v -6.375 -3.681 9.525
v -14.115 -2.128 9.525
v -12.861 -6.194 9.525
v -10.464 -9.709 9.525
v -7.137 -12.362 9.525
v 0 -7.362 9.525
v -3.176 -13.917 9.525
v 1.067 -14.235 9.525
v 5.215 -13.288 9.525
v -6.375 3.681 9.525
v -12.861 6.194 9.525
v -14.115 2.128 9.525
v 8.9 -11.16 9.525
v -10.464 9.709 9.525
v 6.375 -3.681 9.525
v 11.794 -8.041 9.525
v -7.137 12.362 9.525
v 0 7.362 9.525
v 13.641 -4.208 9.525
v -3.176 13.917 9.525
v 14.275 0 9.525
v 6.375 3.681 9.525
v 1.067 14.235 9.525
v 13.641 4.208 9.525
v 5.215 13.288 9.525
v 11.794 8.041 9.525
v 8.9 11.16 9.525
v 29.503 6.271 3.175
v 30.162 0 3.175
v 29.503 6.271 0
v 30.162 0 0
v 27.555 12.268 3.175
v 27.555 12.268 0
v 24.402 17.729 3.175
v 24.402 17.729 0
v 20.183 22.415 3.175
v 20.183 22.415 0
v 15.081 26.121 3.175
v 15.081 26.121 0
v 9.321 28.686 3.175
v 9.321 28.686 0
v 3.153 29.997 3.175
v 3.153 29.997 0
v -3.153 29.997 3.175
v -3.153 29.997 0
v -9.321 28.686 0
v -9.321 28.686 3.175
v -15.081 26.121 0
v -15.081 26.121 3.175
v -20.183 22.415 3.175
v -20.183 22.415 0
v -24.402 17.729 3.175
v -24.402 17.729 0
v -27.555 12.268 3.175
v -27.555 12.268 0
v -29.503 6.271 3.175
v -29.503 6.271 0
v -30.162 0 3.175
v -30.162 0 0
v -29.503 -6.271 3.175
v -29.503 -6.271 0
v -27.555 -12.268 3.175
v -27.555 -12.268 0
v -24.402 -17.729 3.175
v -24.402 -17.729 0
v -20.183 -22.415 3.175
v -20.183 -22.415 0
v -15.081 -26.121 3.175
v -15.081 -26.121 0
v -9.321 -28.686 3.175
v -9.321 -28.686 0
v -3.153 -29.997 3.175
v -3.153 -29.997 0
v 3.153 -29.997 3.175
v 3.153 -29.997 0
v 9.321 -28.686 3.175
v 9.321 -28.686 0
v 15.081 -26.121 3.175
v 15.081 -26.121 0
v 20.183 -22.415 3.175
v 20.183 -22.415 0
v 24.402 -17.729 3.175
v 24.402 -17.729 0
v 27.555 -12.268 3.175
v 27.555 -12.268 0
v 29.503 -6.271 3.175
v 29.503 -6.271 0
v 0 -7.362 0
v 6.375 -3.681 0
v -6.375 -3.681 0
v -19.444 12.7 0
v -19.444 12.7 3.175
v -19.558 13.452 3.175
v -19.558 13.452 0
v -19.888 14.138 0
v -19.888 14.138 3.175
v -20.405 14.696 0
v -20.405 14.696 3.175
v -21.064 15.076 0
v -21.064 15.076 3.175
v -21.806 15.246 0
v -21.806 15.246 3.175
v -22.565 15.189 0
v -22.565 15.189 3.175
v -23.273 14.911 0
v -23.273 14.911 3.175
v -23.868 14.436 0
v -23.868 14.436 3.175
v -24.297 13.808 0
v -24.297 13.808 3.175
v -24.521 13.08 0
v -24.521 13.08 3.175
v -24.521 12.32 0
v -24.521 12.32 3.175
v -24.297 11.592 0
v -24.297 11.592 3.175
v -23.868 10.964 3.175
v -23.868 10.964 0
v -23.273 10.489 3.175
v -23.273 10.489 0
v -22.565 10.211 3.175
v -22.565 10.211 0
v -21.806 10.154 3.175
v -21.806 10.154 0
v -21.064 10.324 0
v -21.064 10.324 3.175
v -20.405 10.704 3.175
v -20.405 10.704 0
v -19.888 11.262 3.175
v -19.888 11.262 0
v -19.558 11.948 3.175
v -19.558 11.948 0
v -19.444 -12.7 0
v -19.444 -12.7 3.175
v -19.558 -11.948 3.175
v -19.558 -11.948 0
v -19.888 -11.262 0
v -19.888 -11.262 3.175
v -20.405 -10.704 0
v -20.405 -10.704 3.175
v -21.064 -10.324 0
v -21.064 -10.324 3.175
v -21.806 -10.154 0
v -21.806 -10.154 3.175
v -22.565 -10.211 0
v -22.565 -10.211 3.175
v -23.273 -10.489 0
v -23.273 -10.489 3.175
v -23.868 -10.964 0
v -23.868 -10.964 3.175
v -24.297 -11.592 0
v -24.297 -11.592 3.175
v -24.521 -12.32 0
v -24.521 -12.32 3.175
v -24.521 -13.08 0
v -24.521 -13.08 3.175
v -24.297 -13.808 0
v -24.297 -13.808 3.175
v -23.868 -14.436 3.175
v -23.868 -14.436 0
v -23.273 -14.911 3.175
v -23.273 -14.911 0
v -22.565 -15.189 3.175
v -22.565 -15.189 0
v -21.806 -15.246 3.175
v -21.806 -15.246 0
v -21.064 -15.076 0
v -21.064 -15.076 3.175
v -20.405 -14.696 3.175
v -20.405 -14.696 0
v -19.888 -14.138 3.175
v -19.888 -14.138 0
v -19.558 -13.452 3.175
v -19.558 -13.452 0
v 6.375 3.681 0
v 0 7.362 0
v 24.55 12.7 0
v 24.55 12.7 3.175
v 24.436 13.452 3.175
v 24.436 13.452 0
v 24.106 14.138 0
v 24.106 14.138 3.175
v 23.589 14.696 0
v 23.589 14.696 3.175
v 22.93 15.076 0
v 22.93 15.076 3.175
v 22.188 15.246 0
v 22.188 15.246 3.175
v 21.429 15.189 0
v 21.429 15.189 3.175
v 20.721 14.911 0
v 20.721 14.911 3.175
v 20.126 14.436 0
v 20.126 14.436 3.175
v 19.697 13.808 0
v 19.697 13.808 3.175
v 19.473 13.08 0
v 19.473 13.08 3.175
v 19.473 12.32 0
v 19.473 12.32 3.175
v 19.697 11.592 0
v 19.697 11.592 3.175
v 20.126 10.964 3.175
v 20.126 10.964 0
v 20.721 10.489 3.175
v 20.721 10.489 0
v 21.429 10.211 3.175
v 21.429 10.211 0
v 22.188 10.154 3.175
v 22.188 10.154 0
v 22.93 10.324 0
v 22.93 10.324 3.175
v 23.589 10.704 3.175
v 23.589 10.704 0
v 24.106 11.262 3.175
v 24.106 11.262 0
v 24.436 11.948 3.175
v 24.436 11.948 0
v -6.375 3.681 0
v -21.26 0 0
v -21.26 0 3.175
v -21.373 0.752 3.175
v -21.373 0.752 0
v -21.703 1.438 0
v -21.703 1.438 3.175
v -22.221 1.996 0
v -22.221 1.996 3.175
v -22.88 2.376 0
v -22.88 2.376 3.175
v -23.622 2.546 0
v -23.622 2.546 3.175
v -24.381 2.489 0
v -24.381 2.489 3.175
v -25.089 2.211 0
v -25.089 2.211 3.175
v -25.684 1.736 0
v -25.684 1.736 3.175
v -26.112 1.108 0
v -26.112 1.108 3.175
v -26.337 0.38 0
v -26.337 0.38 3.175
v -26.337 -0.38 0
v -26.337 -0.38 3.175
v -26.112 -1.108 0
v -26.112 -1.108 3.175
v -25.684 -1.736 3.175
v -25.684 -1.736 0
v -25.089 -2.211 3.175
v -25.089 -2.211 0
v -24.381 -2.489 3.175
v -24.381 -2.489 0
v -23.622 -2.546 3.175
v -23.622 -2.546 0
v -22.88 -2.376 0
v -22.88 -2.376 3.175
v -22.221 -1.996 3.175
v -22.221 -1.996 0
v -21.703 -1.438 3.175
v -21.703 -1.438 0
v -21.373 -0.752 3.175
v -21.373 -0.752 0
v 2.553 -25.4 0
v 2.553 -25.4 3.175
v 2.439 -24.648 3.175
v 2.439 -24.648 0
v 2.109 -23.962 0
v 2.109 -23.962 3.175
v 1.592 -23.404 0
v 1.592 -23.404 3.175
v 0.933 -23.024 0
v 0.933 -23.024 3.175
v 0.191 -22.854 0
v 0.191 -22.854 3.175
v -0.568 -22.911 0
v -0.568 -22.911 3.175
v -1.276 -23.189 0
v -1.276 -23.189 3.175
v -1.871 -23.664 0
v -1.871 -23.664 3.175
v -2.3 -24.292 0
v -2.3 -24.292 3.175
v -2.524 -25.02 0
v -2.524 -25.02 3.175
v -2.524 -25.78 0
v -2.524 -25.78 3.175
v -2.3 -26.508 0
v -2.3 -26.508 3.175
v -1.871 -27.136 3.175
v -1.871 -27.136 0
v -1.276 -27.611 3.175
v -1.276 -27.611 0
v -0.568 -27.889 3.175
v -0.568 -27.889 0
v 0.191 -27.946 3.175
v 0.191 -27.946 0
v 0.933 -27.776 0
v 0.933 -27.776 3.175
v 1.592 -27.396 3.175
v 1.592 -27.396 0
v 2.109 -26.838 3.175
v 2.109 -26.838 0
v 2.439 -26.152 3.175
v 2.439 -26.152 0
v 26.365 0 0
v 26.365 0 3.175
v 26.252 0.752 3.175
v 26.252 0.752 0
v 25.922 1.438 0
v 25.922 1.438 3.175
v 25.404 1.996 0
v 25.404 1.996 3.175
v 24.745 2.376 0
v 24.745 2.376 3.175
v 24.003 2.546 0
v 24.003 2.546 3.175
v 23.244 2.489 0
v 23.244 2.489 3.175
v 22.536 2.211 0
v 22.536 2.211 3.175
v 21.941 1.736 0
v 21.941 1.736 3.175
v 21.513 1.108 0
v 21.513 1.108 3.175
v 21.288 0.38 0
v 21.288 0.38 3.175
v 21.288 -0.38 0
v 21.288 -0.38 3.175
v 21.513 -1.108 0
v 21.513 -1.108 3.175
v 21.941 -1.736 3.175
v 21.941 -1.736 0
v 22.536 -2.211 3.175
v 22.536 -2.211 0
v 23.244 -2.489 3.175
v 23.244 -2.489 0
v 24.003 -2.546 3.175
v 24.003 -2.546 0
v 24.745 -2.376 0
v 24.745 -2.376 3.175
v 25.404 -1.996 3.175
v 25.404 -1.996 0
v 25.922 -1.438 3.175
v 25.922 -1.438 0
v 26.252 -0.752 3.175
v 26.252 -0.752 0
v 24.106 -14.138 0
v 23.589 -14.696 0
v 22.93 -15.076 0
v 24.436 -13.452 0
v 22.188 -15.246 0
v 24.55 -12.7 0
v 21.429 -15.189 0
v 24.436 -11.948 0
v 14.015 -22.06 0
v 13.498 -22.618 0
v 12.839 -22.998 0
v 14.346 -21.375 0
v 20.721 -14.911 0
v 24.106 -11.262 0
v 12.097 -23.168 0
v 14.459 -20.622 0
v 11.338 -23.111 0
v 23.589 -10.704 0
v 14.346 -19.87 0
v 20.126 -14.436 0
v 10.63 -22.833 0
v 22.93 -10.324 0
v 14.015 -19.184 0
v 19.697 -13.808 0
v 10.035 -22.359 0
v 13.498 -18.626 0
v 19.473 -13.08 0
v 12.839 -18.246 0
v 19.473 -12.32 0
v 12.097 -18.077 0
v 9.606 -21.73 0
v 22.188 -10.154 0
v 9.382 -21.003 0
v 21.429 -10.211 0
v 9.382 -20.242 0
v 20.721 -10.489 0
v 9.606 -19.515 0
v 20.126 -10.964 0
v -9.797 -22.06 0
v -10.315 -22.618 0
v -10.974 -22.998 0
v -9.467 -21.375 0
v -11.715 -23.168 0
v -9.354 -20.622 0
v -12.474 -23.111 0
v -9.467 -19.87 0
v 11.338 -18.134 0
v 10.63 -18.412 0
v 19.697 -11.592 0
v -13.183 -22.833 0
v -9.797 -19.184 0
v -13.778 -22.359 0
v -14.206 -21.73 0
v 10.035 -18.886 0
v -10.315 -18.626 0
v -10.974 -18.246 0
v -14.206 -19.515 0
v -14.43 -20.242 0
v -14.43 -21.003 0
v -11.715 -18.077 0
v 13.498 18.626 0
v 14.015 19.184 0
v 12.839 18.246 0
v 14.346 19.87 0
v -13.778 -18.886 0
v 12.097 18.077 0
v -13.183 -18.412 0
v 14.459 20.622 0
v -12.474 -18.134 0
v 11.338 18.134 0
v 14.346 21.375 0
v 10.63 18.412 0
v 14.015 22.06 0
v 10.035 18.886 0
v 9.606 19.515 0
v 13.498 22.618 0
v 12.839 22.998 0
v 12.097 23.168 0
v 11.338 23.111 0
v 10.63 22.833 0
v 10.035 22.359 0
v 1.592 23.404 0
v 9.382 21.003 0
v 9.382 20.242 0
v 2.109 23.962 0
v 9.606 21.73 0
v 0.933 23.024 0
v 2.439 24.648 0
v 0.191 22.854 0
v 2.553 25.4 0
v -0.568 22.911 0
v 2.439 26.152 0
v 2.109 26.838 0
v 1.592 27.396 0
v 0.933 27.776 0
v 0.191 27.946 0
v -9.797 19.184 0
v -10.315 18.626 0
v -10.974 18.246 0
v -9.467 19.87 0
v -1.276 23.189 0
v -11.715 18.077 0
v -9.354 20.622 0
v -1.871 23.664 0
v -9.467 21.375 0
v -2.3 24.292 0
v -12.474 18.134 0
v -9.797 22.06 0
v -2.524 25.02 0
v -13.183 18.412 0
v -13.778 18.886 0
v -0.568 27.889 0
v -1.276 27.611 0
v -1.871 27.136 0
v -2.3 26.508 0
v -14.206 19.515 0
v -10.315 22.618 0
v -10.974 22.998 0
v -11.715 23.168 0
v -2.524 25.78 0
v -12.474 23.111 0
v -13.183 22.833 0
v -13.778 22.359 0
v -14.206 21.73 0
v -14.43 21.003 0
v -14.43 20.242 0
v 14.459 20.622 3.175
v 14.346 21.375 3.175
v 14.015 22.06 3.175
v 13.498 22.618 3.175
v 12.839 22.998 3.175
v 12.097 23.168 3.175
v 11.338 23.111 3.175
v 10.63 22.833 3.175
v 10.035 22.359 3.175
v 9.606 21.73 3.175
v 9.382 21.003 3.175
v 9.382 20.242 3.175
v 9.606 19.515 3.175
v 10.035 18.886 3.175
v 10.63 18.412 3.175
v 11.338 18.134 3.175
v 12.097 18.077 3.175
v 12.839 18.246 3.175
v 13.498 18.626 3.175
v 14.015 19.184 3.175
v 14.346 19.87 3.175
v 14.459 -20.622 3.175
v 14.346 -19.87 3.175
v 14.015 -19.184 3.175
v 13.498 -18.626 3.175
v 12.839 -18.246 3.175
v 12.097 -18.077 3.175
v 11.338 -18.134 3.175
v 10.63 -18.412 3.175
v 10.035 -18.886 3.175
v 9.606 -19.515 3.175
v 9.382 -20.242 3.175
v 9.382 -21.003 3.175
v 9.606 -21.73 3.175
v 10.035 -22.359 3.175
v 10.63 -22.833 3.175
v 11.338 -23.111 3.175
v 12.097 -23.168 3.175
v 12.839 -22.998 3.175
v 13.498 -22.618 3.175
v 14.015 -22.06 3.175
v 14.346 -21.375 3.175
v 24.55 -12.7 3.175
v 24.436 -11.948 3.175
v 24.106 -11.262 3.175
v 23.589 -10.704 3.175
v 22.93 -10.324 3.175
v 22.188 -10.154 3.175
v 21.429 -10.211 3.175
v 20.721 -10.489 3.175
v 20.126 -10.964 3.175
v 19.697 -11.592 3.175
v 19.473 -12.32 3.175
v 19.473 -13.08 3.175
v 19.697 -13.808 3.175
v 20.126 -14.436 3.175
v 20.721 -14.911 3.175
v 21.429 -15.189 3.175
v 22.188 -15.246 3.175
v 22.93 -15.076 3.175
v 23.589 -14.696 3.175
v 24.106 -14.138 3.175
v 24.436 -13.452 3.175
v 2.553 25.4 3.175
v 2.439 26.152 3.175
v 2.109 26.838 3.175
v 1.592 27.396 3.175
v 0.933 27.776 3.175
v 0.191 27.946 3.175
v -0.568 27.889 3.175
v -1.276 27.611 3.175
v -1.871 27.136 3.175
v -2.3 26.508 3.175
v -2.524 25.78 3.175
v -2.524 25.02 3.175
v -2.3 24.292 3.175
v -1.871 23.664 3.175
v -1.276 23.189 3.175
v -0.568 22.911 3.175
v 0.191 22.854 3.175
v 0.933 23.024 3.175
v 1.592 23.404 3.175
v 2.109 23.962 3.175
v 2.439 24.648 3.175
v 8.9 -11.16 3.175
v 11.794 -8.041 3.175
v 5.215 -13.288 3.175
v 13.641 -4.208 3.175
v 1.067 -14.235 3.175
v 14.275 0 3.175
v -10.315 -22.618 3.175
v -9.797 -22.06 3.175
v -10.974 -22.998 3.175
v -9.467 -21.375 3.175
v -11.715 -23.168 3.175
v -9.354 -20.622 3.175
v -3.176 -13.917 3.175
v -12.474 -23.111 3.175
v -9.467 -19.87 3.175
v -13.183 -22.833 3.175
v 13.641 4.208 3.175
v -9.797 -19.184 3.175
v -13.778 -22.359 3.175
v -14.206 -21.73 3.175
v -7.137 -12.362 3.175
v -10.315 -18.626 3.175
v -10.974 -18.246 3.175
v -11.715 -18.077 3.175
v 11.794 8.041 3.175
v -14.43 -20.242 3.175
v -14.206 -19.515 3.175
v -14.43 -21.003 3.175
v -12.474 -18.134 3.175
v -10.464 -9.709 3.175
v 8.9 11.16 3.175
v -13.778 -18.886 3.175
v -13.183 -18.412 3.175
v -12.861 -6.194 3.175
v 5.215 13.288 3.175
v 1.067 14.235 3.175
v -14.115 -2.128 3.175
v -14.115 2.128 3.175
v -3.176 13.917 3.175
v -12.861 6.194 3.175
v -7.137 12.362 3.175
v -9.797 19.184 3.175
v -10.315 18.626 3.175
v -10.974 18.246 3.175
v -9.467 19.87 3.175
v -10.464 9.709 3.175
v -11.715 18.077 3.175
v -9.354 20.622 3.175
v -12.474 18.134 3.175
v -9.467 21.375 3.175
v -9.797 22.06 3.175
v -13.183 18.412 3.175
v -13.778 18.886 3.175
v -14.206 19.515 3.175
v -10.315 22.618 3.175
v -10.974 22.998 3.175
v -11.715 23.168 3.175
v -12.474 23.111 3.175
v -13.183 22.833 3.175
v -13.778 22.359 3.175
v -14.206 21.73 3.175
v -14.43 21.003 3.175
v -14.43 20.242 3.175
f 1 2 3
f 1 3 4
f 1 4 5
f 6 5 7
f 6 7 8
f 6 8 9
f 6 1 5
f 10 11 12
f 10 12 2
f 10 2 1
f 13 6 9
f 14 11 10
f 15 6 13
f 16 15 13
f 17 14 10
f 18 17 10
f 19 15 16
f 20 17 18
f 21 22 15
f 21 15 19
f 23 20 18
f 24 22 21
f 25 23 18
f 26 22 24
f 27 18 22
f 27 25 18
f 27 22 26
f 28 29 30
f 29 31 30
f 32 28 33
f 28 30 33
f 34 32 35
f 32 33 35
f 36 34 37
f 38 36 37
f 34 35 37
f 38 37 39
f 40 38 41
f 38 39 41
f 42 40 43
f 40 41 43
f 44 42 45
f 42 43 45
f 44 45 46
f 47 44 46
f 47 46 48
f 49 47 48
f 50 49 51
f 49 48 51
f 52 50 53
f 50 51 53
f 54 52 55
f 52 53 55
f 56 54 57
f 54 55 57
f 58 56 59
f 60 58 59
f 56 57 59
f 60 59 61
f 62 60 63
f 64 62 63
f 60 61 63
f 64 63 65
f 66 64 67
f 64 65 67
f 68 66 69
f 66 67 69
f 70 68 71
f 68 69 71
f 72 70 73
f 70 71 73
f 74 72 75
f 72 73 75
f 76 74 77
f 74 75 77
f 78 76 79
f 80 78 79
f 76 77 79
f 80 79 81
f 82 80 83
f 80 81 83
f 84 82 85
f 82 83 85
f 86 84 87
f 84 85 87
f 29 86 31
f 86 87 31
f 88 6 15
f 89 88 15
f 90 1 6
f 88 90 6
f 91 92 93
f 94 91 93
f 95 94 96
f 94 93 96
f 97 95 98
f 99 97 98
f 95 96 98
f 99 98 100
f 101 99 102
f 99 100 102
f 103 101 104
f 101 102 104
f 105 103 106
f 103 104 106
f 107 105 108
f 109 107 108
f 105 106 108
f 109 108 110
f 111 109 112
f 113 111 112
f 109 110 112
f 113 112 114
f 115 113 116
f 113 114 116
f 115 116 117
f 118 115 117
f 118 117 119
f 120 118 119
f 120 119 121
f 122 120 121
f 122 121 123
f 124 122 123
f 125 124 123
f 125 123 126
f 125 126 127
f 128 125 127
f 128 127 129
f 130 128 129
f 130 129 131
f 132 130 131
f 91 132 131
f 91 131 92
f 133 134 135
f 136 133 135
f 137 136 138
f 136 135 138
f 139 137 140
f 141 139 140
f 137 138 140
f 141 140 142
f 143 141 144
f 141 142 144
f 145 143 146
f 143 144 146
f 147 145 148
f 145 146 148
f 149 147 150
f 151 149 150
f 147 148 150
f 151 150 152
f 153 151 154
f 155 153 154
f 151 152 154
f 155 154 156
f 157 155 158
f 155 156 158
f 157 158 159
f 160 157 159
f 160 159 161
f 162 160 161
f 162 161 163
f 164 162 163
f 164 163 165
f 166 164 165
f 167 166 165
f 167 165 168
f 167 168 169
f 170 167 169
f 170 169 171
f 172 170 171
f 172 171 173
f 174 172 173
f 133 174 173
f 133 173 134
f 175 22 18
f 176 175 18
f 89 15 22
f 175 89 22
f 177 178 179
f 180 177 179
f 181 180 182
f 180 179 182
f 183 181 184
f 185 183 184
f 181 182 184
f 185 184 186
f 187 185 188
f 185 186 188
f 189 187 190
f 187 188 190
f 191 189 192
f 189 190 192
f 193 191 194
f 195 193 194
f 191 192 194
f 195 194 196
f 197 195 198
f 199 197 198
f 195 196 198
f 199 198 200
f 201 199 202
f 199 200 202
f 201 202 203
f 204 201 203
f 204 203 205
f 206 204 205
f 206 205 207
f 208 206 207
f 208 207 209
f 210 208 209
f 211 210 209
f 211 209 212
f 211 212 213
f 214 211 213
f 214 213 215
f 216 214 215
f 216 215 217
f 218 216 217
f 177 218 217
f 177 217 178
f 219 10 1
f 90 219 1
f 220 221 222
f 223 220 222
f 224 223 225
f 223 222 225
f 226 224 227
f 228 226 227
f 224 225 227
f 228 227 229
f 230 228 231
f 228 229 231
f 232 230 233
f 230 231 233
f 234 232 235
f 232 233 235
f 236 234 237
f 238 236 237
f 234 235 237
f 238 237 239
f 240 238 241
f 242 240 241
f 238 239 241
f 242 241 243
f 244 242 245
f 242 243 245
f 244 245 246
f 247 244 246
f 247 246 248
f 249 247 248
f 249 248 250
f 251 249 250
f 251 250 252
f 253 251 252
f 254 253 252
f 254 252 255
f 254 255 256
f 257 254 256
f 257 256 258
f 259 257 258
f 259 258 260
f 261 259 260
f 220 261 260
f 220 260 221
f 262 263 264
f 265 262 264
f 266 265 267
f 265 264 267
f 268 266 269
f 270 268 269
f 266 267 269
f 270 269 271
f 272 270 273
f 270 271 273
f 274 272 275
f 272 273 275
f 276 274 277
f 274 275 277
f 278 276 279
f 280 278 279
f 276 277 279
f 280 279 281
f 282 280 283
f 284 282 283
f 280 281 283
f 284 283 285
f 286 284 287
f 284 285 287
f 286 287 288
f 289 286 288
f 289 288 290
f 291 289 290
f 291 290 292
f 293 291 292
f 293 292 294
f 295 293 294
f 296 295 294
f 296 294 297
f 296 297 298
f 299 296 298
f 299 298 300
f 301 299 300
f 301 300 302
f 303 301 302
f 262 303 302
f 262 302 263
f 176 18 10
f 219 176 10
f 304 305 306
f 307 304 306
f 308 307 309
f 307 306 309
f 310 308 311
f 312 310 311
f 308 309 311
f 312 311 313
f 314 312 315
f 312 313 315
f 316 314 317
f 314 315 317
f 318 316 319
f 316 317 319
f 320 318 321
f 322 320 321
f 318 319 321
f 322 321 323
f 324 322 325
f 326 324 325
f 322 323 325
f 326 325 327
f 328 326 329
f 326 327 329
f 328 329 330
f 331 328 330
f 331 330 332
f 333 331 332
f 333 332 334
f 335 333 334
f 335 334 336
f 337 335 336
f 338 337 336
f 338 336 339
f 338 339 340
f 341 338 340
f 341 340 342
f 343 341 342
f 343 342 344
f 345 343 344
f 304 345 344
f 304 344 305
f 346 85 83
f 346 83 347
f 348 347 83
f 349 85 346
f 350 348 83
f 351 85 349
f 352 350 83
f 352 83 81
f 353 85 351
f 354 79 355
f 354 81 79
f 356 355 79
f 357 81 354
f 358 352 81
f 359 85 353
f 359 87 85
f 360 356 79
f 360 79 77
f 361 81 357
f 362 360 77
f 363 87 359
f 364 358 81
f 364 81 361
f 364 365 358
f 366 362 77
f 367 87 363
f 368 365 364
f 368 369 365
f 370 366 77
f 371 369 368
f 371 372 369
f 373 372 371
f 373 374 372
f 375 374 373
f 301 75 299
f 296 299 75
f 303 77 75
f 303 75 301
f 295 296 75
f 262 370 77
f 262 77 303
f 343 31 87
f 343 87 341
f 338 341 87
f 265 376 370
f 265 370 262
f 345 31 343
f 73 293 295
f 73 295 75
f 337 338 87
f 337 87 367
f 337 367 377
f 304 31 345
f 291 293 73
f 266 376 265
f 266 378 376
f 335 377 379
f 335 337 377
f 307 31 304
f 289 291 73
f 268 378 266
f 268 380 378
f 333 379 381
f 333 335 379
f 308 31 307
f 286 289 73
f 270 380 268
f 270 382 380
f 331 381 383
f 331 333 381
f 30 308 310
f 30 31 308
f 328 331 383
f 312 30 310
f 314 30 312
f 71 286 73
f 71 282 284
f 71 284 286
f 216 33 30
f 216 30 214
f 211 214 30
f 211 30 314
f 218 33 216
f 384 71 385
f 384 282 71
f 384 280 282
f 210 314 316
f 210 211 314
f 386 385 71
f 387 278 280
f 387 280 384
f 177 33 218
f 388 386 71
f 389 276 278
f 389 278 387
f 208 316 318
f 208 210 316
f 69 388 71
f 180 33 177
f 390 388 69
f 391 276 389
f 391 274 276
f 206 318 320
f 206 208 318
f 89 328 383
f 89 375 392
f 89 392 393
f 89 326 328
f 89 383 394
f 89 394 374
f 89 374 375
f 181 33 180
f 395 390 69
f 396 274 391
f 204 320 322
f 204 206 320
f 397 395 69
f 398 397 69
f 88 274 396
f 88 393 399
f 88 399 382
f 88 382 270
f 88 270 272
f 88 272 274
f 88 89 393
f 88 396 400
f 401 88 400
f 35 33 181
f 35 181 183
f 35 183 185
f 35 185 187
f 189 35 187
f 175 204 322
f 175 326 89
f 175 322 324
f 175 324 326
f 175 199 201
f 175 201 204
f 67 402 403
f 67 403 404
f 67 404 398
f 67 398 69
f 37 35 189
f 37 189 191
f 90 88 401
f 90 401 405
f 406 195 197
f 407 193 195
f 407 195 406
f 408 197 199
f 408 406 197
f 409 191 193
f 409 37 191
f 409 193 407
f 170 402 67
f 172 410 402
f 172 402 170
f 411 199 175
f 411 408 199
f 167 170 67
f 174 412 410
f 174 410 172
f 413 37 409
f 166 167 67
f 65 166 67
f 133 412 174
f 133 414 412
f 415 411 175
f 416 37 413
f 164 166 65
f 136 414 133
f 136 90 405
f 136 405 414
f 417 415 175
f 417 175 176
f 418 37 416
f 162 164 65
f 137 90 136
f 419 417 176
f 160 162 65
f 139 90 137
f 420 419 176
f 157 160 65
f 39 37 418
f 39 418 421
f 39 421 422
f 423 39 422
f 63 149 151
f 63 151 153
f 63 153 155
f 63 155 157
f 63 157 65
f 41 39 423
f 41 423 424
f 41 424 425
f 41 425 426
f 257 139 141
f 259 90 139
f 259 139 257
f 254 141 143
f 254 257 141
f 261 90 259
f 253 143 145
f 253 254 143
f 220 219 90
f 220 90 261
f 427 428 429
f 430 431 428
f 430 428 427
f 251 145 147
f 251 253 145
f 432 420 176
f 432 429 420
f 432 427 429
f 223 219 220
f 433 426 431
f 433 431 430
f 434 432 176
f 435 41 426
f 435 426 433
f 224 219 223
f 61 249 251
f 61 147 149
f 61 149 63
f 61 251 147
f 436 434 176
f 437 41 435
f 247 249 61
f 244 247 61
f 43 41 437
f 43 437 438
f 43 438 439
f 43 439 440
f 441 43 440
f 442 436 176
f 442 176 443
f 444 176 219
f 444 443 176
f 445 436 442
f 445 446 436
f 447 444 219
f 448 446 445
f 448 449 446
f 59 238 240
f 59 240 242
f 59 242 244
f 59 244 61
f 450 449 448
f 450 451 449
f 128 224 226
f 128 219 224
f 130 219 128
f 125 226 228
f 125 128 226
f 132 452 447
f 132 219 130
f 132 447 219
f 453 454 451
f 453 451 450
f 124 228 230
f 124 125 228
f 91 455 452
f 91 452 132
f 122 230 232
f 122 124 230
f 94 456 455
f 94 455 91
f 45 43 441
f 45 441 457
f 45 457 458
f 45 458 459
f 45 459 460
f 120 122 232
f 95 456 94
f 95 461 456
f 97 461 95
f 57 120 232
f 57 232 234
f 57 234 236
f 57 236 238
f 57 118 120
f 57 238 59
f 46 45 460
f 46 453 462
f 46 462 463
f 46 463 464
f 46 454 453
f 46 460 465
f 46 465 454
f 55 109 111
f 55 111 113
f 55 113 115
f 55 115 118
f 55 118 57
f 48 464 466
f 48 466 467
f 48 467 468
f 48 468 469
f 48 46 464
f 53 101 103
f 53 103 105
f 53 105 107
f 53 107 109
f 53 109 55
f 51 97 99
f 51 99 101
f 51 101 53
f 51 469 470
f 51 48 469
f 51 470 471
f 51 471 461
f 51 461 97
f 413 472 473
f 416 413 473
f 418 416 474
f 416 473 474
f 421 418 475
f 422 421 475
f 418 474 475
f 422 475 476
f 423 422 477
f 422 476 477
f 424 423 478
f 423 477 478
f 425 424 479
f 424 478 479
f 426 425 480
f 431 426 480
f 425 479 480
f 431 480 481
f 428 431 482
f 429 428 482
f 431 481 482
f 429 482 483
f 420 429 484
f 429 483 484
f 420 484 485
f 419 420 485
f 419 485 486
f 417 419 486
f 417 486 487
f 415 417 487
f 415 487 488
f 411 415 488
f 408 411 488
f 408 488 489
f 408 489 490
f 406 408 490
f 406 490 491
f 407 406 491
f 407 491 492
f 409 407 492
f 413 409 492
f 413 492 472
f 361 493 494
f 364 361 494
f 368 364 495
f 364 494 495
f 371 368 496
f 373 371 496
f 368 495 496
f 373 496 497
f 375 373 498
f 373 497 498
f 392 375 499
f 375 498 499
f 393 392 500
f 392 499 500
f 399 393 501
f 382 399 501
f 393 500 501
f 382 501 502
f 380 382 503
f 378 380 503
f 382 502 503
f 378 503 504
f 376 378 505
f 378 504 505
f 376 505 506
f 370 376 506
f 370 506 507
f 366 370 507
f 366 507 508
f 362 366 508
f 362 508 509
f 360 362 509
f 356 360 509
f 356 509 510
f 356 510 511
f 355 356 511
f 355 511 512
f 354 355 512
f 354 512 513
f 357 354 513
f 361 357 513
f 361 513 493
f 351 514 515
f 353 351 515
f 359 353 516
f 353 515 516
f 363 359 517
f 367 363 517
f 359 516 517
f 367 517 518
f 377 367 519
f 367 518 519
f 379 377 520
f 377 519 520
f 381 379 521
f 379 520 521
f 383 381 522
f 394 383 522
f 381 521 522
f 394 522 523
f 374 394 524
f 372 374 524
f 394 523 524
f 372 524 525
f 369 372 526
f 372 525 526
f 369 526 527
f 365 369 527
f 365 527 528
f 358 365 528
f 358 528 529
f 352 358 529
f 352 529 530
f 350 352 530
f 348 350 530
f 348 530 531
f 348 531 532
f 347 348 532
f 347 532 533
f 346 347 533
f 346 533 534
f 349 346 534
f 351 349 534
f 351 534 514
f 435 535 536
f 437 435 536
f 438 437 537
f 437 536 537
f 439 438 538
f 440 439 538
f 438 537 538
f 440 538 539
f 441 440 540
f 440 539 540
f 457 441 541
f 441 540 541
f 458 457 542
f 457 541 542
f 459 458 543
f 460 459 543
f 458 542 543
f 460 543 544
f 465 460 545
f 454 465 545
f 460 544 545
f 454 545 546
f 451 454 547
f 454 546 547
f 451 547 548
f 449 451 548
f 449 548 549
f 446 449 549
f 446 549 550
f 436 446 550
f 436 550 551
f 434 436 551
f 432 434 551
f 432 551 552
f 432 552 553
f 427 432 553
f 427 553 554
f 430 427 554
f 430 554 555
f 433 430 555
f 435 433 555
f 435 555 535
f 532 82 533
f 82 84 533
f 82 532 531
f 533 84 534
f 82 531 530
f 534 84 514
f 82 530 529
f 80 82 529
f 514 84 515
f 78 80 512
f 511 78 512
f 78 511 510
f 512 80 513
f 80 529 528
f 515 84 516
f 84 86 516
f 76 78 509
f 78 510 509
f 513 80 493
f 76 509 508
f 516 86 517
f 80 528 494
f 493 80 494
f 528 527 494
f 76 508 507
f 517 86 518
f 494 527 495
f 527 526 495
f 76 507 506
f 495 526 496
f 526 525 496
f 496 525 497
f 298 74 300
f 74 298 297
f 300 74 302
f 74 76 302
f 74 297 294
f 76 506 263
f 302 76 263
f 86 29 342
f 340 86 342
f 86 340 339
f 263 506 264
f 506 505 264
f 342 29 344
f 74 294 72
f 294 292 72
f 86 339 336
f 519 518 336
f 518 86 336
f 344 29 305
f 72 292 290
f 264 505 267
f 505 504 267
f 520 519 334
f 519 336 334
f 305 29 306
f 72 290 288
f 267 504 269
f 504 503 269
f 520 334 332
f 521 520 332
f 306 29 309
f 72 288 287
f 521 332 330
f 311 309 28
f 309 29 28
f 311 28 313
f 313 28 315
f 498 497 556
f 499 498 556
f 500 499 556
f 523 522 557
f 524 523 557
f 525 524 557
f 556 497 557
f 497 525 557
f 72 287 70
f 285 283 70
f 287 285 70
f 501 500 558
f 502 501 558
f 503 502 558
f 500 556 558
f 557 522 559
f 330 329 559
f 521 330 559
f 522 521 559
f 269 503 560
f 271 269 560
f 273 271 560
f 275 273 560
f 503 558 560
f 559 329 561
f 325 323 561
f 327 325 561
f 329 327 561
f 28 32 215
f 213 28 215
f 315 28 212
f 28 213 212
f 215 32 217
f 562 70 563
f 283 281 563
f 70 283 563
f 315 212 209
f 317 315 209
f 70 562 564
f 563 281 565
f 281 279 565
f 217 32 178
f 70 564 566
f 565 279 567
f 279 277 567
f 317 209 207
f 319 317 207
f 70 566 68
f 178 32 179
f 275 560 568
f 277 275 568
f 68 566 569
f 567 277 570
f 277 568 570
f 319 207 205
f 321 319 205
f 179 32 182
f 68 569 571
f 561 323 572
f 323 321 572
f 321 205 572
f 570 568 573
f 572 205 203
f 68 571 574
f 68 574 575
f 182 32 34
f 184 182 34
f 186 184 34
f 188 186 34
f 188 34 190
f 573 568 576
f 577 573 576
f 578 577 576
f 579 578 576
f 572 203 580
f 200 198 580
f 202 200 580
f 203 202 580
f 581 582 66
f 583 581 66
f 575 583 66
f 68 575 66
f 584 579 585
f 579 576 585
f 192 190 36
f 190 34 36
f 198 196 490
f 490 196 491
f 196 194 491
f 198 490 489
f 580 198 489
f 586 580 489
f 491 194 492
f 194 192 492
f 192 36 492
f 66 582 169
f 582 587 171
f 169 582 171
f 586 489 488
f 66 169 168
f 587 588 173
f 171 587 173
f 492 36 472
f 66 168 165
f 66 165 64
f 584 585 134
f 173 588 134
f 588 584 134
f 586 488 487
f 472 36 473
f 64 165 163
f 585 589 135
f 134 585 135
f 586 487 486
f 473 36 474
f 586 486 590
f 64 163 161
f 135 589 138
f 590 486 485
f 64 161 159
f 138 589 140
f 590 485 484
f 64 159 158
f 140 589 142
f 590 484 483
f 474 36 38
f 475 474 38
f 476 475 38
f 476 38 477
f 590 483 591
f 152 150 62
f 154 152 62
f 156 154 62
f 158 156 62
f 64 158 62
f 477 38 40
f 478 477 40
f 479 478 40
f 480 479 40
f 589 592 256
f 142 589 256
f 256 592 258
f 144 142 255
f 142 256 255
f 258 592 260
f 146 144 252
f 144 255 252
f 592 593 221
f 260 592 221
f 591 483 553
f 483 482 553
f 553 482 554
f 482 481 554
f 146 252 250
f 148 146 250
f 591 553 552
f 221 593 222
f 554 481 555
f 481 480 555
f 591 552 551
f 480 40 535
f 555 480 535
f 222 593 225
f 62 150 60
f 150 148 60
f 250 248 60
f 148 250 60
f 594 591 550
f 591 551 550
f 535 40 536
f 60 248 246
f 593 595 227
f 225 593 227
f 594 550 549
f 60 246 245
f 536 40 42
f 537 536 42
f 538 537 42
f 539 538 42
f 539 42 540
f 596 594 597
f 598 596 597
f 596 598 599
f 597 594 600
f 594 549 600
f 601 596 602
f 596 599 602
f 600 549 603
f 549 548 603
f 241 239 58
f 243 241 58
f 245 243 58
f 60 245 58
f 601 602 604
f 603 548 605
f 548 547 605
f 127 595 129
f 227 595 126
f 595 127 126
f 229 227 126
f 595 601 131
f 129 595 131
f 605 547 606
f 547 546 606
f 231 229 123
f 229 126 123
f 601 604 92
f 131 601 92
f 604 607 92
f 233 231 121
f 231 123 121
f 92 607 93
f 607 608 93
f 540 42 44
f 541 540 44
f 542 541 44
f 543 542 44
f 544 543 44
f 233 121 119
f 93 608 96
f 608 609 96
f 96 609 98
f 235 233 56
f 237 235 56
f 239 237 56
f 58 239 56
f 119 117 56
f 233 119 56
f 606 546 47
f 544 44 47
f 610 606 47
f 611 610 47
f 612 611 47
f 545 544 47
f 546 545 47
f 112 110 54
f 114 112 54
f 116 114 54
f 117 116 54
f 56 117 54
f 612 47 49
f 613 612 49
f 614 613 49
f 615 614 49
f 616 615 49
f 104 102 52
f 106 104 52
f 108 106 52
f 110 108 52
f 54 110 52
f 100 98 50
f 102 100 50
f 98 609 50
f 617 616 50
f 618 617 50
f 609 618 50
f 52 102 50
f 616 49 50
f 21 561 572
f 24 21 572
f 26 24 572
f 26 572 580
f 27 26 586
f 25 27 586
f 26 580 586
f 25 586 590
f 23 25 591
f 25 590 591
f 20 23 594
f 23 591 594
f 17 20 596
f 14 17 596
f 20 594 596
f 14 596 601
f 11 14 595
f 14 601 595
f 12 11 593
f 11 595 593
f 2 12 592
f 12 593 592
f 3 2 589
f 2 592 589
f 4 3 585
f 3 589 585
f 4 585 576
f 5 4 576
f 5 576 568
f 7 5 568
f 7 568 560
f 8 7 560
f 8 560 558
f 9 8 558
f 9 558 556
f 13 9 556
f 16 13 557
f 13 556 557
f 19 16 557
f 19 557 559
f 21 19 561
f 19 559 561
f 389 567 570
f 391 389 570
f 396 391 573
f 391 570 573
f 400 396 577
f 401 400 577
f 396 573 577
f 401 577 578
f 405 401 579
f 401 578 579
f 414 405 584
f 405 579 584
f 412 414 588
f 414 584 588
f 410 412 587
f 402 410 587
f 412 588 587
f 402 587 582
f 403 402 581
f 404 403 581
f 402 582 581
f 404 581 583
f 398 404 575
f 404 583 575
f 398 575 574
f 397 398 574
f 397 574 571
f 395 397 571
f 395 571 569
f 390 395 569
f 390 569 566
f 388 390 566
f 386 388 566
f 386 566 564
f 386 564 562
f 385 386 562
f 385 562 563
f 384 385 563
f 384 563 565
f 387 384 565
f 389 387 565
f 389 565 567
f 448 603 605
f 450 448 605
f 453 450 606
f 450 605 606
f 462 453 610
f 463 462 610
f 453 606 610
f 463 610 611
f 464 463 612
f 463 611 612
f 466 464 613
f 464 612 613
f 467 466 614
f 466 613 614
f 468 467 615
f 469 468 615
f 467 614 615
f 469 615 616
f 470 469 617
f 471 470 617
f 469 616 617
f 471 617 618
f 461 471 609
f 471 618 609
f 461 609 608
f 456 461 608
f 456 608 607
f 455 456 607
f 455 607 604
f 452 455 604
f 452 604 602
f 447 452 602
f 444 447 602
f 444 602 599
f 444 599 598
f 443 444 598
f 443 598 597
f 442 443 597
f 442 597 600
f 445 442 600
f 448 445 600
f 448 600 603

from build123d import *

# Parameters (mm, degrees)
SKETCH1_W           = 30.1625
SKETCH1_H           = 3.175
SKETCH2_R           = 14.2748
BOSS_EXTRUDE1_DEPTH = 6.35
CUT_EXTRUDE1_DEPTH  = 10.525
HOLE1_D             = 5.1054
HOLE1_DEPTH         = 9.525


with BuildPart() as part:
    # Sketch1 → Revolve1 (revolve)
    with BuildSketch(Plane(origin=(0, 0, 0), x_dir=(1, 0, 0), z_dir=(0, 1, 0))):
        with Locations((15.08125, -1.5875)):
            Rectangle(SKETCH1_W, SKETCH1_H)
    revolve(axis=Axis((0, 0, 0), (0, 0, 1)))

    # Sketch2 → Boss-Extrude1 (add)
    with BuildSketch(Plane.XY.offset(3.175)):
        Circle(SKETCH2_R)
    extrude(amount=BOSS_EXTRUDE1_DEPTH)

    # Sketch3 → Cut-Extrude1 (cut, through all)
    with BuildSketch(Plane.XY.offset(9.525)):
        Polygon((0, -7.361677812), (6.3754, -3.680838906), (6.3754, 3.680838906), (0, 7.361677812), (-6.3754, 3.680838906), (-6.3754, -3.680838906), align=None)
    extrude(amount=-CUT_EXTRUDE1_DEPTH, mode=Mode.SUBTRACT)

    # Hole1
    with Locations(Plane(origin=(0, 0, 0), x_dir=(-1, 0, 0), z_dir=(0, 0, -1))):
        with Locations((11.90625, 20.622229928), (0, 25.4), (23.8125, 0), (21.997045256, 12.7), (11.90625, -20.622229928), (21.997045256, -12.7), (-11.90625, -20.622229928), (0, -25.4), (-23.8125, 0), (-21.997045256, -12.7), (-11.90625, 20.622229928), (-21.997045256, 12.7)):
            Hole(HOLE1_D / 2, depth=HOLE1_DEPTH)


solid = part.part
